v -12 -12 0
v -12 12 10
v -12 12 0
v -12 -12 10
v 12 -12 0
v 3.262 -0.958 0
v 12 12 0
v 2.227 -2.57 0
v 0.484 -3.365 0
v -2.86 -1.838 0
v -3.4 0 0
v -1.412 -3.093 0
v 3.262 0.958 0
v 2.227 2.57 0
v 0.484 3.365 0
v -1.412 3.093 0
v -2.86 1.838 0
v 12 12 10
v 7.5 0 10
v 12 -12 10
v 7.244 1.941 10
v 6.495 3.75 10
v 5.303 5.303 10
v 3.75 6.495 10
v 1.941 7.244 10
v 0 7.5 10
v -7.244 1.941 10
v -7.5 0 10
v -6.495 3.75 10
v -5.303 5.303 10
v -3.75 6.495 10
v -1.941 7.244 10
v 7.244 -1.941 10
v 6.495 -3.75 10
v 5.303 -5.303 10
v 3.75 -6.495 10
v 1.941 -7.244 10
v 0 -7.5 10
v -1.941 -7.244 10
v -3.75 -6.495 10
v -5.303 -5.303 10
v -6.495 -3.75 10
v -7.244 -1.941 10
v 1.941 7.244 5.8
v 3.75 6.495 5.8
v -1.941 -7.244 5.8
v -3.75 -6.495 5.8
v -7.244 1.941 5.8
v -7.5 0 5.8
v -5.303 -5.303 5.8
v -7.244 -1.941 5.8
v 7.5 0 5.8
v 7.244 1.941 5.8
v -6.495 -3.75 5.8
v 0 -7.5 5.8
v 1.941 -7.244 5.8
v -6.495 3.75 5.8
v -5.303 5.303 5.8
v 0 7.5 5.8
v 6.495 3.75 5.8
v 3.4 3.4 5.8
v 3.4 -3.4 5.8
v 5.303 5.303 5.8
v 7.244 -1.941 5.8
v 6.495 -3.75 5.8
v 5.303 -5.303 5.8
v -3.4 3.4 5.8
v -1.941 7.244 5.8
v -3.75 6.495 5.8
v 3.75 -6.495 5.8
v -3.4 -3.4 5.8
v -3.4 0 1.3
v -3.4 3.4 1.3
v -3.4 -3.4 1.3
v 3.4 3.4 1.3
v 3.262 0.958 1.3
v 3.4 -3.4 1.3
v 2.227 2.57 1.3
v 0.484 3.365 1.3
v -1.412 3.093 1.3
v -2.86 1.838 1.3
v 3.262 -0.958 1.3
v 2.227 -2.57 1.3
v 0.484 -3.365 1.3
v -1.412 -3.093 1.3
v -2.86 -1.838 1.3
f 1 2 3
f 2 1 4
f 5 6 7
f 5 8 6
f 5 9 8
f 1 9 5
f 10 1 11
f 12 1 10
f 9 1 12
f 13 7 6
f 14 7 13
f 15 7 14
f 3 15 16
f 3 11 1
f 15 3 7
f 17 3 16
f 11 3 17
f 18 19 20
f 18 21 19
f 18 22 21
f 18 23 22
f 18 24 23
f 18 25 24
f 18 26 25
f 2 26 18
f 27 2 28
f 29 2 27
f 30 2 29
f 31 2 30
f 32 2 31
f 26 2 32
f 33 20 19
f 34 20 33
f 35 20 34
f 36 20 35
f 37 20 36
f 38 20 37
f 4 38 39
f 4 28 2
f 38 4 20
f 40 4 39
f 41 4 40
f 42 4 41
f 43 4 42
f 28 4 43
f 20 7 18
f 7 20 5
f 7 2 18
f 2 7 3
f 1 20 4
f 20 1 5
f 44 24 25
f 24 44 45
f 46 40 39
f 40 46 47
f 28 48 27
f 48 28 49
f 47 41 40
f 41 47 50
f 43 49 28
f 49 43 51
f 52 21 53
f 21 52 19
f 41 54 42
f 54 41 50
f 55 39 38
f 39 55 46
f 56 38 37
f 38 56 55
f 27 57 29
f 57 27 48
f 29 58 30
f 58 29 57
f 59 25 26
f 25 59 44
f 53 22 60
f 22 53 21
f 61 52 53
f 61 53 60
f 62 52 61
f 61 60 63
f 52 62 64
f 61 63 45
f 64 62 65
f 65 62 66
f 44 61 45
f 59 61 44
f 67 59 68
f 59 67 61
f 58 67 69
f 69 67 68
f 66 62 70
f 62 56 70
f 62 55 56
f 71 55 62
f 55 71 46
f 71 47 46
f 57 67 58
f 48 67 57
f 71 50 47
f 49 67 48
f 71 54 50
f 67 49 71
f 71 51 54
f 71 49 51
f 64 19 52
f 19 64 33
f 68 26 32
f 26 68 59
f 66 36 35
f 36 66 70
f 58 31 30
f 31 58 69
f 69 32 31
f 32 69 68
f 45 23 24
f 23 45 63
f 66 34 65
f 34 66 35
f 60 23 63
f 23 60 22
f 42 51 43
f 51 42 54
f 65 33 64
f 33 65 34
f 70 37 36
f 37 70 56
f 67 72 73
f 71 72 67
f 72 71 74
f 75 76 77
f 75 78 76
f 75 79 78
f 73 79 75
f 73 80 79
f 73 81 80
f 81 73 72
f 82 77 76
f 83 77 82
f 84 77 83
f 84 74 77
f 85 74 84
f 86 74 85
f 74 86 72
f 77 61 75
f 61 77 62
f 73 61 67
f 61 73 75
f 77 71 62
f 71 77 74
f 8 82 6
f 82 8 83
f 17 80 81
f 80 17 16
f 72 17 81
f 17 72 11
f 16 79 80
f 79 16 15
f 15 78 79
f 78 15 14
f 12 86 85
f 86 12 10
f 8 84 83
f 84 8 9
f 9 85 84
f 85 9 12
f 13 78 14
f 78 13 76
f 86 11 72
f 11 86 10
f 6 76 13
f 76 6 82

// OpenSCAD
translate(v = [0, 0, 10]) {
	rotate(a = 180, v = [0, 1, 0]) {
		difference() {
			difference() {
				difference() {
					translate(v = [0, 0, 5]) {
						cube(center = true, size = [24, 24, 10]);
					}
					cylinder(h = 4.2000000000, r = 7.5000000000);
				}
				translate(v = [0, 0, 6.4500000000]) {
					cube(center = true, size = [6.8000000000, 6.8000000000, 4.5000000000]);
				}
			}
			cylinder(h = 12, r = 3.4000000000);
		}
	}
}
